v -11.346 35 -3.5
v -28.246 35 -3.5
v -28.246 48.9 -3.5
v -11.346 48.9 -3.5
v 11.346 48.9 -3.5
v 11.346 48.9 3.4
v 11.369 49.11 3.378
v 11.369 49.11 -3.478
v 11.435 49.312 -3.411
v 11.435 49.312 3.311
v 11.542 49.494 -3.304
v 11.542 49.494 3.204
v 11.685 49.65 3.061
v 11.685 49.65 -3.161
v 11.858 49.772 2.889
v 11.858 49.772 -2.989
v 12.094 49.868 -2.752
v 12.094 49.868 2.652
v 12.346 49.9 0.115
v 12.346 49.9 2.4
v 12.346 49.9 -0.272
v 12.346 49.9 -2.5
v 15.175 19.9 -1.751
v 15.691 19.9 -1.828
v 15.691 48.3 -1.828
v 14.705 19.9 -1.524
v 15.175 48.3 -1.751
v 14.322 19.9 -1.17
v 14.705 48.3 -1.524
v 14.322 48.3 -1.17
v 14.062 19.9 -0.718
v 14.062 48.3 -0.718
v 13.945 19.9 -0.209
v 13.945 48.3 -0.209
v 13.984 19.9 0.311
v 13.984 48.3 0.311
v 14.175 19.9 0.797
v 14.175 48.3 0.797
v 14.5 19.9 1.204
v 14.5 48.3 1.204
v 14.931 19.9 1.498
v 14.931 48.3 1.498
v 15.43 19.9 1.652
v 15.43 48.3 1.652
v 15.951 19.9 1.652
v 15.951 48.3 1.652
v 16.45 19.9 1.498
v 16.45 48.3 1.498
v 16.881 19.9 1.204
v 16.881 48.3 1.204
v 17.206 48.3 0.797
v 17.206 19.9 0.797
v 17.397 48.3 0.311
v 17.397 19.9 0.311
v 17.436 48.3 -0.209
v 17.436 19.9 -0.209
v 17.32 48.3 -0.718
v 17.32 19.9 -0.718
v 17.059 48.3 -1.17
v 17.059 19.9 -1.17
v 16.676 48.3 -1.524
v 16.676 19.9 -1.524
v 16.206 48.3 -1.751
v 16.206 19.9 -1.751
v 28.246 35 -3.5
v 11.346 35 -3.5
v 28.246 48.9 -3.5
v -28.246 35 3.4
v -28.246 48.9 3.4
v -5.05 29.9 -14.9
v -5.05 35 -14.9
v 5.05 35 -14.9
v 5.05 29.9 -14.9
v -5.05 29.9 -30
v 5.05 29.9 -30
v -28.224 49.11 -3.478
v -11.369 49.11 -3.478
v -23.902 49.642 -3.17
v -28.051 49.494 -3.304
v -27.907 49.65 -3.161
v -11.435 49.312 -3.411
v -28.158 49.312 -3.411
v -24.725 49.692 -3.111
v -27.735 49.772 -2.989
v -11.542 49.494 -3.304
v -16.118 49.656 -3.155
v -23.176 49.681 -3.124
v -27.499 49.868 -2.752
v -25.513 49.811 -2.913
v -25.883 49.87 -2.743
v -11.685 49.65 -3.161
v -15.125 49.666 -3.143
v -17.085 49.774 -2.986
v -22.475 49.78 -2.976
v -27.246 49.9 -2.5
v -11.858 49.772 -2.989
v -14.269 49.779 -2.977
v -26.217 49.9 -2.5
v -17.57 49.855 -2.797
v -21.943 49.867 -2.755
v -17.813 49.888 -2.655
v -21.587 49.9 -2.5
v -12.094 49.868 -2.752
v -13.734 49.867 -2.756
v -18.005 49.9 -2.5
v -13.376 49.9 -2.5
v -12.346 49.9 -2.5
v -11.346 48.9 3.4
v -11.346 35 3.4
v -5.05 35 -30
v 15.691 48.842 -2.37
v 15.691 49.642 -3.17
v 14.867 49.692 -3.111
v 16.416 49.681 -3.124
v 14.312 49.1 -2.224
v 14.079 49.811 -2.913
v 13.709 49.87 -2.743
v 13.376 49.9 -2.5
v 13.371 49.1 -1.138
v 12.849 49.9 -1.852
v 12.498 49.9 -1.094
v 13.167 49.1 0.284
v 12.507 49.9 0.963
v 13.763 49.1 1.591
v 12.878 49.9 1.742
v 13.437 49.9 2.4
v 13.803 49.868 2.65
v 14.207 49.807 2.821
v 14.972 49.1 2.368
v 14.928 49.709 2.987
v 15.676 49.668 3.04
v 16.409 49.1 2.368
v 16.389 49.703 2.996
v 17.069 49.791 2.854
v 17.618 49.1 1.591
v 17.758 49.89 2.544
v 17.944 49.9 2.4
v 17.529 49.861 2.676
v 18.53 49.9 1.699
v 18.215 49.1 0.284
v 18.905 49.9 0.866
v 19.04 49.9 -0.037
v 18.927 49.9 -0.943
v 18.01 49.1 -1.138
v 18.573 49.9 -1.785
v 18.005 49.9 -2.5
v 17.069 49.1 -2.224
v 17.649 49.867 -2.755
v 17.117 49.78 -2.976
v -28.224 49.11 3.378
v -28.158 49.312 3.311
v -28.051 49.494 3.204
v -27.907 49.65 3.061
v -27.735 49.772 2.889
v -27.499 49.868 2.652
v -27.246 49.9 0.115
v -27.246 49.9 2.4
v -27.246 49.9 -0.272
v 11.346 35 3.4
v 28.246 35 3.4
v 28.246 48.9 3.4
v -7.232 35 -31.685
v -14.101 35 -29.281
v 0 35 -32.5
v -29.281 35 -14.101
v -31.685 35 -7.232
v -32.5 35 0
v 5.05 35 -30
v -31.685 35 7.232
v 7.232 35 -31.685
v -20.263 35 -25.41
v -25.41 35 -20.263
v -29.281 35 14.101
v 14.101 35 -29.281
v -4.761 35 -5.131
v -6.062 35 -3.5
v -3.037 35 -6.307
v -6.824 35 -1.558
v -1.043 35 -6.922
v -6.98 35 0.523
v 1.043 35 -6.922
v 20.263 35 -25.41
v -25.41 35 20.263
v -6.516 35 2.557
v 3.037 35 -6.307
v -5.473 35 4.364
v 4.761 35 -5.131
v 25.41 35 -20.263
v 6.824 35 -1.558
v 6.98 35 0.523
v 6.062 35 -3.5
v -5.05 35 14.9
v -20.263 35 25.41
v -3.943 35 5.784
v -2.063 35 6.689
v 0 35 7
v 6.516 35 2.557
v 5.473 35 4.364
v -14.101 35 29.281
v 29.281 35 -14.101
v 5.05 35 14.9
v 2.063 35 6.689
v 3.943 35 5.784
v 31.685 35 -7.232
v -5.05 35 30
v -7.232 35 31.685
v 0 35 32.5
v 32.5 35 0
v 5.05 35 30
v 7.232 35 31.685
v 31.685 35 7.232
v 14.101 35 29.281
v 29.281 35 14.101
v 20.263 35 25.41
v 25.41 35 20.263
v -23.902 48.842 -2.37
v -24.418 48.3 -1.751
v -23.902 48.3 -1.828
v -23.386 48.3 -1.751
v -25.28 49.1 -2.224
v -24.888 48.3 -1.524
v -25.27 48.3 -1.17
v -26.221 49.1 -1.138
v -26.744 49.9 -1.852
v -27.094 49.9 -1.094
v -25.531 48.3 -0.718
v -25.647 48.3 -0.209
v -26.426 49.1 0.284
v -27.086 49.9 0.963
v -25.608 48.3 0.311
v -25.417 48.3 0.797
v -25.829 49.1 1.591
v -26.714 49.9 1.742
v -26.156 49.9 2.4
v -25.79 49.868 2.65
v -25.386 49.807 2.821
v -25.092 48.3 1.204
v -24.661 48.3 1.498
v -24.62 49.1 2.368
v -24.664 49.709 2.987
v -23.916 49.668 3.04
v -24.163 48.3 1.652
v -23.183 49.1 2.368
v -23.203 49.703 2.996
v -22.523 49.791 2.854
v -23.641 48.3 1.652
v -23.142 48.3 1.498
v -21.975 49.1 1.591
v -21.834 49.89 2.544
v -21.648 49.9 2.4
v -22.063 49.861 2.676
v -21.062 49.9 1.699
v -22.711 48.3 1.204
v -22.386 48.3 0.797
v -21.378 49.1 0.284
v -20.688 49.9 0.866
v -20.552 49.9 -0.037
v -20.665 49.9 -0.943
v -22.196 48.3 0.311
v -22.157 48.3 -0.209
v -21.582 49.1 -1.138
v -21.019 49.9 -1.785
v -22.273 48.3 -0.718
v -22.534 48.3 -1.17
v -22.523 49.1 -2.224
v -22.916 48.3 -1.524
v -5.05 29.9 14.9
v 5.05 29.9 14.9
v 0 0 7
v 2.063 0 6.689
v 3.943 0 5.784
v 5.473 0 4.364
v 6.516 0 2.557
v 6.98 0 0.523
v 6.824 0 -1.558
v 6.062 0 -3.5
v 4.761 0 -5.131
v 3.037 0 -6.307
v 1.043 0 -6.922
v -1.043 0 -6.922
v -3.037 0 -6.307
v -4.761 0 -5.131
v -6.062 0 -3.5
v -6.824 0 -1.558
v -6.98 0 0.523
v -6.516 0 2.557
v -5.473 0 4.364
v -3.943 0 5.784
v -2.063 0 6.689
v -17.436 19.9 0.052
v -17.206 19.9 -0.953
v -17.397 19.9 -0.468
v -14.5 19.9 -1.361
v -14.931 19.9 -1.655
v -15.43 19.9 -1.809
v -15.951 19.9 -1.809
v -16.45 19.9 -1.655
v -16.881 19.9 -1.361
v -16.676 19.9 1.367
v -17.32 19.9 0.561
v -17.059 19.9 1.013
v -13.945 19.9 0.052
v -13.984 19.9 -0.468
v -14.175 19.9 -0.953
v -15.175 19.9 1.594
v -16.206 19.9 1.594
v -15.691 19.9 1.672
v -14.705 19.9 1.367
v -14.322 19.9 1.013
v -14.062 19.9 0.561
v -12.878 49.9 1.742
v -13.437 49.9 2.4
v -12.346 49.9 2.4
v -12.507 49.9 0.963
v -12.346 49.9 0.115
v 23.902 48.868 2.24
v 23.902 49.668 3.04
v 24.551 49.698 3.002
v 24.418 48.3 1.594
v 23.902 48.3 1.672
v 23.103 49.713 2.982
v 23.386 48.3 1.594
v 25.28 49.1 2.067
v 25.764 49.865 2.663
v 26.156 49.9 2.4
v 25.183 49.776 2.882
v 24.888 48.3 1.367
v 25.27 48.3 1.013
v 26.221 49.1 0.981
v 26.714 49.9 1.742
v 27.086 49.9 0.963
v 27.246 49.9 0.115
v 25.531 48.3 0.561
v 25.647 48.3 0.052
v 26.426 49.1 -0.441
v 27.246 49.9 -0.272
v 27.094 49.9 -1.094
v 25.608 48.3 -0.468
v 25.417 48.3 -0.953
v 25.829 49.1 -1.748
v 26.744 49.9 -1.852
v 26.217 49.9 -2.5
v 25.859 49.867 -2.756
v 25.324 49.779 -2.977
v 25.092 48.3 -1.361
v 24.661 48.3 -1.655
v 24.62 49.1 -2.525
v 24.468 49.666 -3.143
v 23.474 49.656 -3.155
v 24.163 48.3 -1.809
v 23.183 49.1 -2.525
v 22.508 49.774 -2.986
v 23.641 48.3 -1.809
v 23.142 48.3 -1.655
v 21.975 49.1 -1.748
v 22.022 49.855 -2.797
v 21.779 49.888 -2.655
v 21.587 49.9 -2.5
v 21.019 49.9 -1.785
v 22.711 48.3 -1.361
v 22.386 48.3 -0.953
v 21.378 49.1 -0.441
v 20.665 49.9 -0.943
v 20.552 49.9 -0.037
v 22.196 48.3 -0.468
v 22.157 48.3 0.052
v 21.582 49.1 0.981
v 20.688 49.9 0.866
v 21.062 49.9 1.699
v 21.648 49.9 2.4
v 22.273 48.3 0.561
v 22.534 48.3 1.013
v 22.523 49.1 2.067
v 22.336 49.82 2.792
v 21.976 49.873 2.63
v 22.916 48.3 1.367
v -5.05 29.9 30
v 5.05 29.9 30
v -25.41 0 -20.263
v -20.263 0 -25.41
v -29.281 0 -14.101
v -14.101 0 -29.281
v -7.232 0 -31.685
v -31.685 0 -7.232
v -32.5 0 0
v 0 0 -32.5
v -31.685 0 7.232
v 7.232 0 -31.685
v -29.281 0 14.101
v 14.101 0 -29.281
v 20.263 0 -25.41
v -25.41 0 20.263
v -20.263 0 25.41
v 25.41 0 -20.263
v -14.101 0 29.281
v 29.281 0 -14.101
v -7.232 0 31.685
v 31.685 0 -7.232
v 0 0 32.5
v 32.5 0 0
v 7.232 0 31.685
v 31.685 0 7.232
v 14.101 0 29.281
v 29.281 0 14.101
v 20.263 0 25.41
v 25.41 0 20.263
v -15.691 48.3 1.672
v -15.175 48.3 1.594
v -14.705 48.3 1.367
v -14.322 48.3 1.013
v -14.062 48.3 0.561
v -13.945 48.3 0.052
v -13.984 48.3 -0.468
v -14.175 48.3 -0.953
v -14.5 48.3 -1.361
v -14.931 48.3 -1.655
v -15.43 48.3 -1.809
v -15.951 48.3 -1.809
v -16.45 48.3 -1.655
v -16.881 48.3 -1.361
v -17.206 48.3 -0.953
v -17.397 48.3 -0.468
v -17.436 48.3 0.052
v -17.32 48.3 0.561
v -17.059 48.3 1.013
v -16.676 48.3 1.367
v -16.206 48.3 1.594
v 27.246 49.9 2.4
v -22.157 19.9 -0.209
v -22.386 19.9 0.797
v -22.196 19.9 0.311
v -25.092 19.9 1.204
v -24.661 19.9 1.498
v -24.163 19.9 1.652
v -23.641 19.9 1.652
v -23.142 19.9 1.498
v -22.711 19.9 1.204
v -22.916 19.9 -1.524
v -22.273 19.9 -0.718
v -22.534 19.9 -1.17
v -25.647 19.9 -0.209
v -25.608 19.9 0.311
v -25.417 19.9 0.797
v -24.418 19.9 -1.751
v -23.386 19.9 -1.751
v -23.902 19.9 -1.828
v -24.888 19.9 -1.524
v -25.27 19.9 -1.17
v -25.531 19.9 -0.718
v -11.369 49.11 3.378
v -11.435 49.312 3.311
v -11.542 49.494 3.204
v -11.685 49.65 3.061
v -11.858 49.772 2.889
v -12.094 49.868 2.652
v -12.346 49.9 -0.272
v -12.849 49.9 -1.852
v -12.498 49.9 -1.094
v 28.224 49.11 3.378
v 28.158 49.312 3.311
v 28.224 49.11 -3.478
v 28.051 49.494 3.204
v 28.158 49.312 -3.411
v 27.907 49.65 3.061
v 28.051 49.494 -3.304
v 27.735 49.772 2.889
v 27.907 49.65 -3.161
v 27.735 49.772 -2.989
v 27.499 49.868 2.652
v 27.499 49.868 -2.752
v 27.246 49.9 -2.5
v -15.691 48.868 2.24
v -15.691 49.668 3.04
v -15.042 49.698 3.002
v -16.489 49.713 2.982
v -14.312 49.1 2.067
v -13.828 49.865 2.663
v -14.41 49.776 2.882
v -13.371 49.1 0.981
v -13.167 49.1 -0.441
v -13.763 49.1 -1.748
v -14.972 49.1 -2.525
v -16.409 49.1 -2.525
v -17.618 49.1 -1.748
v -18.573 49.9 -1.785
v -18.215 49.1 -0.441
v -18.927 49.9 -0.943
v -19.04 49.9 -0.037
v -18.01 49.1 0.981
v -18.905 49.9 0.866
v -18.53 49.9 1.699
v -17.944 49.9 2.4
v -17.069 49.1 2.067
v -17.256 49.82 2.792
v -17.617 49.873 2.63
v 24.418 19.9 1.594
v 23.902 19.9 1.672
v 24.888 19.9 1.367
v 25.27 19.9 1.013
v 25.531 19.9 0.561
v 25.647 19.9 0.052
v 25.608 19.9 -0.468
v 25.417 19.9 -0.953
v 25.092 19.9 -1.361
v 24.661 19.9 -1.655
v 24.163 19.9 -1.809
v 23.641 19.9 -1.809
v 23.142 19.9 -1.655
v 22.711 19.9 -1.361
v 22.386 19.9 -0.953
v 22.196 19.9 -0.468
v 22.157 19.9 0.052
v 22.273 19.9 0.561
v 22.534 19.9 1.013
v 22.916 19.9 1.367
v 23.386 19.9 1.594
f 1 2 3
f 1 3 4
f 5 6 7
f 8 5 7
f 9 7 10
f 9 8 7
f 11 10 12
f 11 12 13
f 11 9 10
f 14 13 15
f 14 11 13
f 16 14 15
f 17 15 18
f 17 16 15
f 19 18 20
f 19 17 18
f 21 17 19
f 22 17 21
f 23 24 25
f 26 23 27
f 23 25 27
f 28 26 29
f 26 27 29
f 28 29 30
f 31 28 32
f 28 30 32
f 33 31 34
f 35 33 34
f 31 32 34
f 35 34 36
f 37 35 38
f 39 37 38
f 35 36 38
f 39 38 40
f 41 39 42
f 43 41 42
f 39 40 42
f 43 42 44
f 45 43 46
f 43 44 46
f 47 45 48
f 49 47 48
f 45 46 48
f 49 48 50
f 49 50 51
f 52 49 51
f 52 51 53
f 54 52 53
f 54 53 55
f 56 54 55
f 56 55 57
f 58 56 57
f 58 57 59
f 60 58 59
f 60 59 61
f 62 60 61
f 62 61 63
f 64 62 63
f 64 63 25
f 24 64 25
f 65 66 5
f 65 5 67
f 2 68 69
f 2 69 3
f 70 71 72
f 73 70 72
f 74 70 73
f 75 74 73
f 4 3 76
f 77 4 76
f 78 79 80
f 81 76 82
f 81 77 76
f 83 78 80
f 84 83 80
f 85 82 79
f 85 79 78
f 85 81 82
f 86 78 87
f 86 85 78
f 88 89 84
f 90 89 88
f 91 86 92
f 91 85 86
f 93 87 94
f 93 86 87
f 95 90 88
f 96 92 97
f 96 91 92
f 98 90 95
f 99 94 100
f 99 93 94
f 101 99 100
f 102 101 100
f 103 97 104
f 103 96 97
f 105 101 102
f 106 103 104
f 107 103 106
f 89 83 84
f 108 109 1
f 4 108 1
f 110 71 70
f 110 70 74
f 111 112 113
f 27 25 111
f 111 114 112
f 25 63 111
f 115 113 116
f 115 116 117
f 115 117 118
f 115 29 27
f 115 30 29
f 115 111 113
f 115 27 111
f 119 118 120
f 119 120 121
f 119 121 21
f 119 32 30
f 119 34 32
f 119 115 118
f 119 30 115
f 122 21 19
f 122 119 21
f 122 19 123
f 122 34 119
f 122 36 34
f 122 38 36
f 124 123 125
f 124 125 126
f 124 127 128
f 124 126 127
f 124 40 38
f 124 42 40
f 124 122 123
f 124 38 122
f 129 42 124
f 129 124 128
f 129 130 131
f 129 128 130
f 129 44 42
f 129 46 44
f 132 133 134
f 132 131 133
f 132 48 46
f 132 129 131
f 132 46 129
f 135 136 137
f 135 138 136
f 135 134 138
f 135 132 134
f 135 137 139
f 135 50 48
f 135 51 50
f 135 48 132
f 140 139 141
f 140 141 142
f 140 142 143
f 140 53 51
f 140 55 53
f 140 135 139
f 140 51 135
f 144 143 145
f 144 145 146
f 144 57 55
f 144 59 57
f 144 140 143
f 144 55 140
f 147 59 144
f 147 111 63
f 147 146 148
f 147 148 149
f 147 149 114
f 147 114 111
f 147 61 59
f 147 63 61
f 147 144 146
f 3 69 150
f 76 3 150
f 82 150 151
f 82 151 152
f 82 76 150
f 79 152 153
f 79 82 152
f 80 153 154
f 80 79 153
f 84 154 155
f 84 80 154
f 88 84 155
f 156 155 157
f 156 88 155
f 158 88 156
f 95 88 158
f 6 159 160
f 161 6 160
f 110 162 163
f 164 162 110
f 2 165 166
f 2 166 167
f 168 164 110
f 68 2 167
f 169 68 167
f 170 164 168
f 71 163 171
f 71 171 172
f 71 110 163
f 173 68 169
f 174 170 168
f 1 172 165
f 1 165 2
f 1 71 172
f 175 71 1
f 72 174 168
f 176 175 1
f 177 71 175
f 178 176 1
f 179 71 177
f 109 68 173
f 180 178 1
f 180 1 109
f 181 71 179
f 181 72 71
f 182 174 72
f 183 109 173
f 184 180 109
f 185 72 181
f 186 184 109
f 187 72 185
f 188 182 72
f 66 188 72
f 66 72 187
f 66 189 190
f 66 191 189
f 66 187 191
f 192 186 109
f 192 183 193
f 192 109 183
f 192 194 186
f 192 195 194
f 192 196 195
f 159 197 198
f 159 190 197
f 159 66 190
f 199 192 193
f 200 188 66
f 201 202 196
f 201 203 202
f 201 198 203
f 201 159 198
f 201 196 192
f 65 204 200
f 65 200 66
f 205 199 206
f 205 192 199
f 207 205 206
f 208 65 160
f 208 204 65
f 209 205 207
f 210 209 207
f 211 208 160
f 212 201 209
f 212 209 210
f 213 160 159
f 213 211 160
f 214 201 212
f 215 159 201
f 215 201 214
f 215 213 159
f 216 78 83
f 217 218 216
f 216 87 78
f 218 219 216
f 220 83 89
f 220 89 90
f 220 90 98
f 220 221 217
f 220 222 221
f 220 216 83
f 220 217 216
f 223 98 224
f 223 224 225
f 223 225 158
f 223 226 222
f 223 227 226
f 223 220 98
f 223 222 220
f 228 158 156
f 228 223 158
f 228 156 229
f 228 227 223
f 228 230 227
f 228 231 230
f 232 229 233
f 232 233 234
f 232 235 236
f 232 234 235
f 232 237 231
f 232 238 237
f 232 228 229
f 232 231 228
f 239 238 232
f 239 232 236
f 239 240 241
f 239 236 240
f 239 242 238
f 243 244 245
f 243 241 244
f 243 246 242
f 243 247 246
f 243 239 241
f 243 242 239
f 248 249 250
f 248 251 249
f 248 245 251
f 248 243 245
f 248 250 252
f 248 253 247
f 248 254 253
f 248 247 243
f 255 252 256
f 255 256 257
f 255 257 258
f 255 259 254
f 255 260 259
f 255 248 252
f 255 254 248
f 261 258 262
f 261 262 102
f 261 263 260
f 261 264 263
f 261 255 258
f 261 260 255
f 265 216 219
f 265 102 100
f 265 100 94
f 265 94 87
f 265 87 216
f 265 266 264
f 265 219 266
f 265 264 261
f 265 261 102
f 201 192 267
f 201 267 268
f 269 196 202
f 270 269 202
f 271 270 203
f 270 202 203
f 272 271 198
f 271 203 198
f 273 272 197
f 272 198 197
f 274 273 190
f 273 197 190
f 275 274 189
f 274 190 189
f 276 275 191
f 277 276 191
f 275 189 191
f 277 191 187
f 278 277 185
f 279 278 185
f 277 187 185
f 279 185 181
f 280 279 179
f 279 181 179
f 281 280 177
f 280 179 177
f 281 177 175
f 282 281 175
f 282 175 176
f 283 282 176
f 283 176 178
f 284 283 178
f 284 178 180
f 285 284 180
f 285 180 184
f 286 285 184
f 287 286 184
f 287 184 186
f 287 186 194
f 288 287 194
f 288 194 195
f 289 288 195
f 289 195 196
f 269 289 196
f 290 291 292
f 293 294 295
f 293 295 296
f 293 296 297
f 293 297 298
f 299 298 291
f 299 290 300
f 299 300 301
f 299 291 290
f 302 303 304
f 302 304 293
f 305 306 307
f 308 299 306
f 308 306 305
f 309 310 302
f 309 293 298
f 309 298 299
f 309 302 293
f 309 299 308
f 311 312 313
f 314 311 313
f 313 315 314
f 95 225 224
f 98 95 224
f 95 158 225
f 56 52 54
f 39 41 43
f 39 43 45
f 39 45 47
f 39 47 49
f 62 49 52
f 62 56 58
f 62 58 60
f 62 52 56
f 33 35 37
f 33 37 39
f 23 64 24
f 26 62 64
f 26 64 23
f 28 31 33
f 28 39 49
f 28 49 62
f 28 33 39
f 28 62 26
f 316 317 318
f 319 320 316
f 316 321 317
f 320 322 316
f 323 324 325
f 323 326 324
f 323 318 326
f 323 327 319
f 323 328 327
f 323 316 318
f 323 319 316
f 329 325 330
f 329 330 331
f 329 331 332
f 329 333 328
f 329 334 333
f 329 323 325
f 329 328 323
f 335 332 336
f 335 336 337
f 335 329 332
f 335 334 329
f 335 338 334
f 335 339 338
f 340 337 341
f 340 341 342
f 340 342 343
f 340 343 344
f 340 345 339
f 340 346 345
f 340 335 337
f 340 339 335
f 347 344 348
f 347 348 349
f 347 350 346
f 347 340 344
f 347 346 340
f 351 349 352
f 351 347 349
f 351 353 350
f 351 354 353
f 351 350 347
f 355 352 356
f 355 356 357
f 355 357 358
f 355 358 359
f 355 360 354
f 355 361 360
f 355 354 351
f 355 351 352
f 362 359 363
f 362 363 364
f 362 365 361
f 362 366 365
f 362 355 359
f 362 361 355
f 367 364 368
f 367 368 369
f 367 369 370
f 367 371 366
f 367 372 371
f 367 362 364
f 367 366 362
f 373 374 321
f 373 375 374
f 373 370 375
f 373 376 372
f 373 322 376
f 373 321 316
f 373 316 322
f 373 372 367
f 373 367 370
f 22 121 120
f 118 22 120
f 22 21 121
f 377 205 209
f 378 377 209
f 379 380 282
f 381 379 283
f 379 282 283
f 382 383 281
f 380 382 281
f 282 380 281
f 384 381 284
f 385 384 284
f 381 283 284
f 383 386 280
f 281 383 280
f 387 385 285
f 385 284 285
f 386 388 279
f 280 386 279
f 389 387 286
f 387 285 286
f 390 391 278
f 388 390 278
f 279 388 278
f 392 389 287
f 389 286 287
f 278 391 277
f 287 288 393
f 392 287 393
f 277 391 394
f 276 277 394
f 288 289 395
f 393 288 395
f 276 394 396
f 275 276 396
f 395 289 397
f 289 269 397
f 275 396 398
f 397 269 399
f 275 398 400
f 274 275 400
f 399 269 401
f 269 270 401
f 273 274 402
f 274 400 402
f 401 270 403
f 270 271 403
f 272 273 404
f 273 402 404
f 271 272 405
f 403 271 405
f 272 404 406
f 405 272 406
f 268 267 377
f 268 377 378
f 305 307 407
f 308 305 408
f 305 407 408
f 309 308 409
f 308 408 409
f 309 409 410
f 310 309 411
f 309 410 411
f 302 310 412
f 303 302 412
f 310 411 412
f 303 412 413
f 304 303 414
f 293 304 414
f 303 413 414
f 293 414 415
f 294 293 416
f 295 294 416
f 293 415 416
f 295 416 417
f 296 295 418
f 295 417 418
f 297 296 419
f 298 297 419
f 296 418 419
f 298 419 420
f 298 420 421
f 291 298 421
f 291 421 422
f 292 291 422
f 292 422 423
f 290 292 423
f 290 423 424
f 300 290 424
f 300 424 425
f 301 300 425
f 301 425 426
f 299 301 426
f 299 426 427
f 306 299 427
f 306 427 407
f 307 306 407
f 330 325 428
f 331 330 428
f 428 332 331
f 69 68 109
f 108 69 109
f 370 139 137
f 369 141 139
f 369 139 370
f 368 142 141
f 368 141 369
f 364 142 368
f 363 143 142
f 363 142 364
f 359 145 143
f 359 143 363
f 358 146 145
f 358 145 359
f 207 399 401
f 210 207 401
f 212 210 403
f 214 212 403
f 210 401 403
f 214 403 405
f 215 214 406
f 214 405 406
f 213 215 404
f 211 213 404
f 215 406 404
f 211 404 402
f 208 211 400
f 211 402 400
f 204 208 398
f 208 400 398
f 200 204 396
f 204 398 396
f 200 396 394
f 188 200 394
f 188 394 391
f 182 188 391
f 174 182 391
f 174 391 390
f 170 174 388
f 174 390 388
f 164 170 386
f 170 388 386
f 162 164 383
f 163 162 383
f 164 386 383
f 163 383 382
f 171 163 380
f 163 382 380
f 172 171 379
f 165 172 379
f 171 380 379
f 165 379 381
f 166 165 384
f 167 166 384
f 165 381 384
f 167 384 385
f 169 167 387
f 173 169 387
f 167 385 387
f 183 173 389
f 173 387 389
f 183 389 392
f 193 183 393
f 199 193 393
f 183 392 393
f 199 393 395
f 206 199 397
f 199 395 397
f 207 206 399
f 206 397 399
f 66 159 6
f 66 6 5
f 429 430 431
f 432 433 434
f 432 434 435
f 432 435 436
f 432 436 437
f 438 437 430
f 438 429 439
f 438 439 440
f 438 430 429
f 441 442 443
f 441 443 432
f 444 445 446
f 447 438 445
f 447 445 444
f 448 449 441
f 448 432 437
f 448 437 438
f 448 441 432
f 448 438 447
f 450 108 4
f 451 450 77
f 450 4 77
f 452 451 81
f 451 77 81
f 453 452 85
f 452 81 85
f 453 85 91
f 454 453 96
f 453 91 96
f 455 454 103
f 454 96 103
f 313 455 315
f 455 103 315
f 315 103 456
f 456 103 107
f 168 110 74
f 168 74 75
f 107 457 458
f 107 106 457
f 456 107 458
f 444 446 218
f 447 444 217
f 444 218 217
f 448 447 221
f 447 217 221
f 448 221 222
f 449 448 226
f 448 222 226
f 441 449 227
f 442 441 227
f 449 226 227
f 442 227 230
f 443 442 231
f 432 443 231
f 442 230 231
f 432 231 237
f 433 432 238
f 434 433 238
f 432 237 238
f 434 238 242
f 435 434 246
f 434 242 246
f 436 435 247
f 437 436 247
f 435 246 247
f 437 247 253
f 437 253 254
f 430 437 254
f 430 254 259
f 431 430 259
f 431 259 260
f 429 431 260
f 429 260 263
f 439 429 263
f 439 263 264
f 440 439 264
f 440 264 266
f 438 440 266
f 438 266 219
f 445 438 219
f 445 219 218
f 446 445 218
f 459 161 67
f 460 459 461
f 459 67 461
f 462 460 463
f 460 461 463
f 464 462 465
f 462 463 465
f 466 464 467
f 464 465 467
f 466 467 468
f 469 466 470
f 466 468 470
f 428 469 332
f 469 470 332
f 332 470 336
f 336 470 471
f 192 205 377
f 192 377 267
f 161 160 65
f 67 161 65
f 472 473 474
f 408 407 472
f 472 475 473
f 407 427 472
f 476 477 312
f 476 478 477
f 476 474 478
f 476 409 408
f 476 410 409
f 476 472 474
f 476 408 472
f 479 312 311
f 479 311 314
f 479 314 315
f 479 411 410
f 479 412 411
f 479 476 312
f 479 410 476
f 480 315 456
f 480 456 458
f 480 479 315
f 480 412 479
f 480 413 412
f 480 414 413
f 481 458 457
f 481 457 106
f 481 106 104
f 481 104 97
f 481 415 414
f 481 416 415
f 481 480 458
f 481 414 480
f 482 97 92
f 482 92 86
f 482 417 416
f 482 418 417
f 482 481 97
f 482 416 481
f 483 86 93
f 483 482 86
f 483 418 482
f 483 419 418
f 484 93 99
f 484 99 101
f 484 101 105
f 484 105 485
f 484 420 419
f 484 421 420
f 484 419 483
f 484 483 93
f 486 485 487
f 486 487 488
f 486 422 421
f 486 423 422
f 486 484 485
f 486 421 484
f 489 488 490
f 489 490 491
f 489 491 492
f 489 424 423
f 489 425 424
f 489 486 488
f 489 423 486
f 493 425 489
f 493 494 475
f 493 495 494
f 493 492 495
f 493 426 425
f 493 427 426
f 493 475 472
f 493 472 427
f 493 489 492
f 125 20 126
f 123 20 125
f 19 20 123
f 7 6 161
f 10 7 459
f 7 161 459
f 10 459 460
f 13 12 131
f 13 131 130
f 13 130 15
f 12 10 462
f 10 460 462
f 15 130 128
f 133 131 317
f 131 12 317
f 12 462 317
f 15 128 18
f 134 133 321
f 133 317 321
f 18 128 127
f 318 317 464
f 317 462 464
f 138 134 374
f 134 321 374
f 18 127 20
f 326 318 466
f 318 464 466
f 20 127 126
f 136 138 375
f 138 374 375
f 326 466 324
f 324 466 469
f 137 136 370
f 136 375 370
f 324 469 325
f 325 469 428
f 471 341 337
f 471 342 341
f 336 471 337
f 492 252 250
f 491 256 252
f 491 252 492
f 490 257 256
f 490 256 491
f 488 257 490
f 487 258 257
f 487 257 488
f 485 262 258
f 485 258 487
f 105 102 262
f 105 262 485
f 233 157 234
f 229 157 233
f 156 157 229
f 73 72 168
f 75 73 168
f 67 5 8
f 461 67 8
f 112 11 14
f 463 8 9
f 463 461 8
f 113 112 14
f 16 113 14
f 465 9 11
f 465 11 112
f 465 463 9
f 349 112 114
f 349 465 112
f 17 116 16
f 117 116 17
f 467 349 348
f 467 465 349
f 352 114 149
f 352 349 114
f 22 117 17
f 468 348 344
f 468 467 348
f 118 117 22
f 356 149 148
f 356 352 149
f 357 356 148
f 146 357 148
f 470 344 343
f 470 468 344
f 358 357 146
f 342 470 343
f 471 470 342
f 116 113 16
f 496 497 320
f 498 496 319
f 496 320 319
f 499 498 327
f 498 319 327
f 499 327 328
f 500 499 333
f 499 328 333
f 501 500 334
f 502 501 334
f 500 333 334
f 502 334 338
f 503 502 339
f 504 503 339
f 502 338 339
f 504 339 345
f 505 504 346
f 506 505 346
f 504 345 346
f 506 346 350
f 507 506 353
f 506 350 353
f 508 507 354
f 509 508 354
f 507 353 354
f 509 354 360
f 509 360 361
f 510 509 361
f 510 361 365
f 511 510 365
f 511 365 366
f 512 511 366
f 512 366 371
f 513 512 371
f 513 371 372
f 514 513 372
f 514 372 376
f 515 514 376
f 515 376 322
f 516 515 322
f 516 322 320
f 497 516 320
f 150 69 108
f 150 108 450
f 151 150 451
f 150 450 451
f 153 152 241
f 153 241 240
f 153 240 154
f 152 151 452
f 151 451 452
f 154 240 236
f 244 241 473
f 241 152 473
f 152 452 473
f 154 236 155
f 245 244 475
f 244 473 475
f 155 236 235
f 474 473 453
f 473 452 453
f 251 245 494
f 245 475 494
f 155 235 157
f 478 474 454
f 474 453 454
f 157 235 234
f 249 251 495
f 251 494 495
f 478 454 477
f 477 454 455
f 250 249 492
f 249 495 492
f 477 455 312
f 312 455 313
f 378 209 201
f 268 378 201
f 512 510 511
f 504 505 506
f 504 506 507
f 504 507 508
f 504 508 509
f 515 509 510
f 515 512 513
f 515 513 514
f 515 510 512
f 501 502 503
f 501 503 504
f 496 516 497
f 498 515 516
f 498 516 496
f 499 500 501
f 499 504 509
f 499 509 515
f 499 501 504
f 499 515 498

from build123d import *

# Parameters (mm, degrees)
SKETCH1_R           = 32.5
BOSS_EXTRUDE1_DEPTH = 35
SKETCH2_W           = 10.1
SKETCH2_H           = 15.1
CUT_EXTRUDE1_DEPTH  = 5.1
SKETCH3_R           = 7
CUT_EXTRUDE2_DEPTH  = 58.771100041
SKETCH4_W           = 16.9
SKETCH4_H           = 6.9
BOSS_EXTRUDE2_DEPTH = 14.9
FILLET2_R           = 1
SKETCH5_R           = 1.75
CUT_EXTRUDE3_DEPTH  = 30
CHAMFER1_SIZE       = 1.6


with BuildPart() as part:
    # Sketch1 → Boss-Extrude1 (new body)
    with BuildSketch(Plane(origin=(0, 0, 0), x_dir=(1, 0, 0), z_dir=(0, 1, 0))):
        with Locations(Location((0, 0, 0), (0, 0, 270))):
            Circle(SKETCH1_R)
    extrude(amount=BOSS_EXTRUDE1_DEPTH)

    # Sketch2 → Cut-Extrude1 (cut)
    with BuildSketch(Plane(origin=(0, 35, 0), x_dir=(1, 0, 0), z_dir=(0, 1, 0))):
        with Locations((0, 22.45)):
            Rectangle(SKETCH2_W, SKETCH2_H)
        with Locations((0, -22.45)):
            Rectangle(SKETCH2_W, SKETCH2_H)
    extrude(amount=-CUT_EXTRUDE1_DEPTH, mode=Mode.SUBTRACT)

    # Sketch3 → Cut-Extrude2 (cut, through all)
    with BuildSketch(Plane(origin=(0, 35, 0), x_dir=(1, 0, 0), z_dir=(0, 1, 0))):
        with Locations(Location((0, 0, 0), (0, 0, 270))):
            Circle(SKETCH3_R)
    extrude(amount=-CUT_EXTRUDE2_DEPTH, mode=Mode.SUBTRACT)

    # Sketch4 → Boss-Extrude2 (add)
    with BuildSketch(Plane(origin=(0, 35, 0), x_dir=(1, 0, 0), z_dir=(0, 1, 0))):
        with Locations((19.796175473, 0.05)):
            Rectangle(SKETCH4_W, SKETCH4_H)
        with Locations((-19.796175473, 0.05)):
            Rectangle(SKETCH4_W, SKETCH4_H)
    extrude(amount=BOSS_EXTRUDE2_DEPTH)

    # Fillet2
    fillet2_edges = [part.edges().sort_by_distance(p)[0] for p in [
        (28.246175473, 49.9, -0.05),
        (19.796175473, 49.9, -3.5),
        (11.346175473, 49.9, -0.05),
        (19.796175473, 49.9, 3.4),
        (-19.796175473, 49.9, 3.4),
        (-11.346175473, 49.9, -0.05),
        (-19.796175473, 49.9, -3.5),
        (-28.246175473, 49.9, -0.05),
    ]]
    fillet(fillet2_edges, radius=FILLET2_R)

    # Sketch5 → Cut-Extrude3 (cut)
    with BuildSketch(Plane(origin=(0, 49.9, 0), x_dir=(1, 0, 0), z_dir=(0, 1, 0))):
        with Locations(Location((23.901775473, 0.078488913, 0), (0, 0, 270))):
            Circle(SKETCH5_R)
        with Locations(Location((15.690575474, 0.078488913, 0), (0, 0, 90))):
            Circle(SKETCH5_R)
        with Locations(Location((-15.690575474, 0.078488913, 0), (0, 0, 270))):
            Circle(SKETCH5_R)
        with Locations(Location((-23.901775473, 0.078488913, 0), (0, 0, 90))):
            Circle(SKETCH5_R)
    extrude(amount=-CUT_EXTRUDE3_DEPTH, mode=Mode.SUBTRACT)

    # Chamfer1
    # the kernel refuses this chamfer: 1.6 mm, written as the material it takes off along each edge
    with BuildSketch(Plane(origin=(23.901775473, 49.9, -0.078488913), x_dir=(0, 0, 1), z_dir=(-1, 0, 0))) as chamfer1_piece_1:
        Polygon((1.75 + CHAMFER1_SIZE, 0), (1.75, -CHAMFER1_SIZE), (1.75, 0), align=None)
    revolve(axis=Axis((23.901775473, 49.9, -0.078488913), (0, 1, 0)), mode=Mode.SUBTRACT)
    with BuildSketch(Plane(origin=(-15.690575474, 49.9, -0.078488913), x_dir=(0, 0, 1), z_dir=(-1, 0, 0))) as chamfer1_piece_2:
        Polygon((1.75 + CHAMFER1_SIZE, 0), (1.75, -CHAMFER1_SIZE), (1.75, 0), align=None)
    revolve(axis=Axis((-15.690575474, 49.9, -0.078488913), (0, 1, 0)), mode=Mode.SUBTRACT)
    with BuildSketch(Plane(origin=(15.690575474, 49.9, -0.078488913), x_dir=(0, 0, -1), z_dir=(1, 0, 0))) as chamfer1_piece_3:
        Polygon((1.75 + CHAMFER1_SIZE, 0), (1.75, -CHAMFER1_SIZE), (1.75, 0), align=None)
    revolve(axis=Axis((15.690575474, 49.9, -0.078488913), (0, 1, 0)), mode=Mode.SUBTRACT)
    with BuildSketch(Plane(origin=(-23.901775473, 49.9, -0.078488913), x_dir=(0, 0, -1), z_dir=(1, 0, 0))) as chamfer1_piece_4:
        Polygon((1.75 + CHAMFER1_SIZE, 0), (1.75, -CHAMFER1_SIZE), (1.75, 0), align=None)
    revolve(axis=Axis((-23.901775473, 49.9, -0.078488913), (0, 1, 0)), mode=Mode.SUBTRACT)


solid = part.part
